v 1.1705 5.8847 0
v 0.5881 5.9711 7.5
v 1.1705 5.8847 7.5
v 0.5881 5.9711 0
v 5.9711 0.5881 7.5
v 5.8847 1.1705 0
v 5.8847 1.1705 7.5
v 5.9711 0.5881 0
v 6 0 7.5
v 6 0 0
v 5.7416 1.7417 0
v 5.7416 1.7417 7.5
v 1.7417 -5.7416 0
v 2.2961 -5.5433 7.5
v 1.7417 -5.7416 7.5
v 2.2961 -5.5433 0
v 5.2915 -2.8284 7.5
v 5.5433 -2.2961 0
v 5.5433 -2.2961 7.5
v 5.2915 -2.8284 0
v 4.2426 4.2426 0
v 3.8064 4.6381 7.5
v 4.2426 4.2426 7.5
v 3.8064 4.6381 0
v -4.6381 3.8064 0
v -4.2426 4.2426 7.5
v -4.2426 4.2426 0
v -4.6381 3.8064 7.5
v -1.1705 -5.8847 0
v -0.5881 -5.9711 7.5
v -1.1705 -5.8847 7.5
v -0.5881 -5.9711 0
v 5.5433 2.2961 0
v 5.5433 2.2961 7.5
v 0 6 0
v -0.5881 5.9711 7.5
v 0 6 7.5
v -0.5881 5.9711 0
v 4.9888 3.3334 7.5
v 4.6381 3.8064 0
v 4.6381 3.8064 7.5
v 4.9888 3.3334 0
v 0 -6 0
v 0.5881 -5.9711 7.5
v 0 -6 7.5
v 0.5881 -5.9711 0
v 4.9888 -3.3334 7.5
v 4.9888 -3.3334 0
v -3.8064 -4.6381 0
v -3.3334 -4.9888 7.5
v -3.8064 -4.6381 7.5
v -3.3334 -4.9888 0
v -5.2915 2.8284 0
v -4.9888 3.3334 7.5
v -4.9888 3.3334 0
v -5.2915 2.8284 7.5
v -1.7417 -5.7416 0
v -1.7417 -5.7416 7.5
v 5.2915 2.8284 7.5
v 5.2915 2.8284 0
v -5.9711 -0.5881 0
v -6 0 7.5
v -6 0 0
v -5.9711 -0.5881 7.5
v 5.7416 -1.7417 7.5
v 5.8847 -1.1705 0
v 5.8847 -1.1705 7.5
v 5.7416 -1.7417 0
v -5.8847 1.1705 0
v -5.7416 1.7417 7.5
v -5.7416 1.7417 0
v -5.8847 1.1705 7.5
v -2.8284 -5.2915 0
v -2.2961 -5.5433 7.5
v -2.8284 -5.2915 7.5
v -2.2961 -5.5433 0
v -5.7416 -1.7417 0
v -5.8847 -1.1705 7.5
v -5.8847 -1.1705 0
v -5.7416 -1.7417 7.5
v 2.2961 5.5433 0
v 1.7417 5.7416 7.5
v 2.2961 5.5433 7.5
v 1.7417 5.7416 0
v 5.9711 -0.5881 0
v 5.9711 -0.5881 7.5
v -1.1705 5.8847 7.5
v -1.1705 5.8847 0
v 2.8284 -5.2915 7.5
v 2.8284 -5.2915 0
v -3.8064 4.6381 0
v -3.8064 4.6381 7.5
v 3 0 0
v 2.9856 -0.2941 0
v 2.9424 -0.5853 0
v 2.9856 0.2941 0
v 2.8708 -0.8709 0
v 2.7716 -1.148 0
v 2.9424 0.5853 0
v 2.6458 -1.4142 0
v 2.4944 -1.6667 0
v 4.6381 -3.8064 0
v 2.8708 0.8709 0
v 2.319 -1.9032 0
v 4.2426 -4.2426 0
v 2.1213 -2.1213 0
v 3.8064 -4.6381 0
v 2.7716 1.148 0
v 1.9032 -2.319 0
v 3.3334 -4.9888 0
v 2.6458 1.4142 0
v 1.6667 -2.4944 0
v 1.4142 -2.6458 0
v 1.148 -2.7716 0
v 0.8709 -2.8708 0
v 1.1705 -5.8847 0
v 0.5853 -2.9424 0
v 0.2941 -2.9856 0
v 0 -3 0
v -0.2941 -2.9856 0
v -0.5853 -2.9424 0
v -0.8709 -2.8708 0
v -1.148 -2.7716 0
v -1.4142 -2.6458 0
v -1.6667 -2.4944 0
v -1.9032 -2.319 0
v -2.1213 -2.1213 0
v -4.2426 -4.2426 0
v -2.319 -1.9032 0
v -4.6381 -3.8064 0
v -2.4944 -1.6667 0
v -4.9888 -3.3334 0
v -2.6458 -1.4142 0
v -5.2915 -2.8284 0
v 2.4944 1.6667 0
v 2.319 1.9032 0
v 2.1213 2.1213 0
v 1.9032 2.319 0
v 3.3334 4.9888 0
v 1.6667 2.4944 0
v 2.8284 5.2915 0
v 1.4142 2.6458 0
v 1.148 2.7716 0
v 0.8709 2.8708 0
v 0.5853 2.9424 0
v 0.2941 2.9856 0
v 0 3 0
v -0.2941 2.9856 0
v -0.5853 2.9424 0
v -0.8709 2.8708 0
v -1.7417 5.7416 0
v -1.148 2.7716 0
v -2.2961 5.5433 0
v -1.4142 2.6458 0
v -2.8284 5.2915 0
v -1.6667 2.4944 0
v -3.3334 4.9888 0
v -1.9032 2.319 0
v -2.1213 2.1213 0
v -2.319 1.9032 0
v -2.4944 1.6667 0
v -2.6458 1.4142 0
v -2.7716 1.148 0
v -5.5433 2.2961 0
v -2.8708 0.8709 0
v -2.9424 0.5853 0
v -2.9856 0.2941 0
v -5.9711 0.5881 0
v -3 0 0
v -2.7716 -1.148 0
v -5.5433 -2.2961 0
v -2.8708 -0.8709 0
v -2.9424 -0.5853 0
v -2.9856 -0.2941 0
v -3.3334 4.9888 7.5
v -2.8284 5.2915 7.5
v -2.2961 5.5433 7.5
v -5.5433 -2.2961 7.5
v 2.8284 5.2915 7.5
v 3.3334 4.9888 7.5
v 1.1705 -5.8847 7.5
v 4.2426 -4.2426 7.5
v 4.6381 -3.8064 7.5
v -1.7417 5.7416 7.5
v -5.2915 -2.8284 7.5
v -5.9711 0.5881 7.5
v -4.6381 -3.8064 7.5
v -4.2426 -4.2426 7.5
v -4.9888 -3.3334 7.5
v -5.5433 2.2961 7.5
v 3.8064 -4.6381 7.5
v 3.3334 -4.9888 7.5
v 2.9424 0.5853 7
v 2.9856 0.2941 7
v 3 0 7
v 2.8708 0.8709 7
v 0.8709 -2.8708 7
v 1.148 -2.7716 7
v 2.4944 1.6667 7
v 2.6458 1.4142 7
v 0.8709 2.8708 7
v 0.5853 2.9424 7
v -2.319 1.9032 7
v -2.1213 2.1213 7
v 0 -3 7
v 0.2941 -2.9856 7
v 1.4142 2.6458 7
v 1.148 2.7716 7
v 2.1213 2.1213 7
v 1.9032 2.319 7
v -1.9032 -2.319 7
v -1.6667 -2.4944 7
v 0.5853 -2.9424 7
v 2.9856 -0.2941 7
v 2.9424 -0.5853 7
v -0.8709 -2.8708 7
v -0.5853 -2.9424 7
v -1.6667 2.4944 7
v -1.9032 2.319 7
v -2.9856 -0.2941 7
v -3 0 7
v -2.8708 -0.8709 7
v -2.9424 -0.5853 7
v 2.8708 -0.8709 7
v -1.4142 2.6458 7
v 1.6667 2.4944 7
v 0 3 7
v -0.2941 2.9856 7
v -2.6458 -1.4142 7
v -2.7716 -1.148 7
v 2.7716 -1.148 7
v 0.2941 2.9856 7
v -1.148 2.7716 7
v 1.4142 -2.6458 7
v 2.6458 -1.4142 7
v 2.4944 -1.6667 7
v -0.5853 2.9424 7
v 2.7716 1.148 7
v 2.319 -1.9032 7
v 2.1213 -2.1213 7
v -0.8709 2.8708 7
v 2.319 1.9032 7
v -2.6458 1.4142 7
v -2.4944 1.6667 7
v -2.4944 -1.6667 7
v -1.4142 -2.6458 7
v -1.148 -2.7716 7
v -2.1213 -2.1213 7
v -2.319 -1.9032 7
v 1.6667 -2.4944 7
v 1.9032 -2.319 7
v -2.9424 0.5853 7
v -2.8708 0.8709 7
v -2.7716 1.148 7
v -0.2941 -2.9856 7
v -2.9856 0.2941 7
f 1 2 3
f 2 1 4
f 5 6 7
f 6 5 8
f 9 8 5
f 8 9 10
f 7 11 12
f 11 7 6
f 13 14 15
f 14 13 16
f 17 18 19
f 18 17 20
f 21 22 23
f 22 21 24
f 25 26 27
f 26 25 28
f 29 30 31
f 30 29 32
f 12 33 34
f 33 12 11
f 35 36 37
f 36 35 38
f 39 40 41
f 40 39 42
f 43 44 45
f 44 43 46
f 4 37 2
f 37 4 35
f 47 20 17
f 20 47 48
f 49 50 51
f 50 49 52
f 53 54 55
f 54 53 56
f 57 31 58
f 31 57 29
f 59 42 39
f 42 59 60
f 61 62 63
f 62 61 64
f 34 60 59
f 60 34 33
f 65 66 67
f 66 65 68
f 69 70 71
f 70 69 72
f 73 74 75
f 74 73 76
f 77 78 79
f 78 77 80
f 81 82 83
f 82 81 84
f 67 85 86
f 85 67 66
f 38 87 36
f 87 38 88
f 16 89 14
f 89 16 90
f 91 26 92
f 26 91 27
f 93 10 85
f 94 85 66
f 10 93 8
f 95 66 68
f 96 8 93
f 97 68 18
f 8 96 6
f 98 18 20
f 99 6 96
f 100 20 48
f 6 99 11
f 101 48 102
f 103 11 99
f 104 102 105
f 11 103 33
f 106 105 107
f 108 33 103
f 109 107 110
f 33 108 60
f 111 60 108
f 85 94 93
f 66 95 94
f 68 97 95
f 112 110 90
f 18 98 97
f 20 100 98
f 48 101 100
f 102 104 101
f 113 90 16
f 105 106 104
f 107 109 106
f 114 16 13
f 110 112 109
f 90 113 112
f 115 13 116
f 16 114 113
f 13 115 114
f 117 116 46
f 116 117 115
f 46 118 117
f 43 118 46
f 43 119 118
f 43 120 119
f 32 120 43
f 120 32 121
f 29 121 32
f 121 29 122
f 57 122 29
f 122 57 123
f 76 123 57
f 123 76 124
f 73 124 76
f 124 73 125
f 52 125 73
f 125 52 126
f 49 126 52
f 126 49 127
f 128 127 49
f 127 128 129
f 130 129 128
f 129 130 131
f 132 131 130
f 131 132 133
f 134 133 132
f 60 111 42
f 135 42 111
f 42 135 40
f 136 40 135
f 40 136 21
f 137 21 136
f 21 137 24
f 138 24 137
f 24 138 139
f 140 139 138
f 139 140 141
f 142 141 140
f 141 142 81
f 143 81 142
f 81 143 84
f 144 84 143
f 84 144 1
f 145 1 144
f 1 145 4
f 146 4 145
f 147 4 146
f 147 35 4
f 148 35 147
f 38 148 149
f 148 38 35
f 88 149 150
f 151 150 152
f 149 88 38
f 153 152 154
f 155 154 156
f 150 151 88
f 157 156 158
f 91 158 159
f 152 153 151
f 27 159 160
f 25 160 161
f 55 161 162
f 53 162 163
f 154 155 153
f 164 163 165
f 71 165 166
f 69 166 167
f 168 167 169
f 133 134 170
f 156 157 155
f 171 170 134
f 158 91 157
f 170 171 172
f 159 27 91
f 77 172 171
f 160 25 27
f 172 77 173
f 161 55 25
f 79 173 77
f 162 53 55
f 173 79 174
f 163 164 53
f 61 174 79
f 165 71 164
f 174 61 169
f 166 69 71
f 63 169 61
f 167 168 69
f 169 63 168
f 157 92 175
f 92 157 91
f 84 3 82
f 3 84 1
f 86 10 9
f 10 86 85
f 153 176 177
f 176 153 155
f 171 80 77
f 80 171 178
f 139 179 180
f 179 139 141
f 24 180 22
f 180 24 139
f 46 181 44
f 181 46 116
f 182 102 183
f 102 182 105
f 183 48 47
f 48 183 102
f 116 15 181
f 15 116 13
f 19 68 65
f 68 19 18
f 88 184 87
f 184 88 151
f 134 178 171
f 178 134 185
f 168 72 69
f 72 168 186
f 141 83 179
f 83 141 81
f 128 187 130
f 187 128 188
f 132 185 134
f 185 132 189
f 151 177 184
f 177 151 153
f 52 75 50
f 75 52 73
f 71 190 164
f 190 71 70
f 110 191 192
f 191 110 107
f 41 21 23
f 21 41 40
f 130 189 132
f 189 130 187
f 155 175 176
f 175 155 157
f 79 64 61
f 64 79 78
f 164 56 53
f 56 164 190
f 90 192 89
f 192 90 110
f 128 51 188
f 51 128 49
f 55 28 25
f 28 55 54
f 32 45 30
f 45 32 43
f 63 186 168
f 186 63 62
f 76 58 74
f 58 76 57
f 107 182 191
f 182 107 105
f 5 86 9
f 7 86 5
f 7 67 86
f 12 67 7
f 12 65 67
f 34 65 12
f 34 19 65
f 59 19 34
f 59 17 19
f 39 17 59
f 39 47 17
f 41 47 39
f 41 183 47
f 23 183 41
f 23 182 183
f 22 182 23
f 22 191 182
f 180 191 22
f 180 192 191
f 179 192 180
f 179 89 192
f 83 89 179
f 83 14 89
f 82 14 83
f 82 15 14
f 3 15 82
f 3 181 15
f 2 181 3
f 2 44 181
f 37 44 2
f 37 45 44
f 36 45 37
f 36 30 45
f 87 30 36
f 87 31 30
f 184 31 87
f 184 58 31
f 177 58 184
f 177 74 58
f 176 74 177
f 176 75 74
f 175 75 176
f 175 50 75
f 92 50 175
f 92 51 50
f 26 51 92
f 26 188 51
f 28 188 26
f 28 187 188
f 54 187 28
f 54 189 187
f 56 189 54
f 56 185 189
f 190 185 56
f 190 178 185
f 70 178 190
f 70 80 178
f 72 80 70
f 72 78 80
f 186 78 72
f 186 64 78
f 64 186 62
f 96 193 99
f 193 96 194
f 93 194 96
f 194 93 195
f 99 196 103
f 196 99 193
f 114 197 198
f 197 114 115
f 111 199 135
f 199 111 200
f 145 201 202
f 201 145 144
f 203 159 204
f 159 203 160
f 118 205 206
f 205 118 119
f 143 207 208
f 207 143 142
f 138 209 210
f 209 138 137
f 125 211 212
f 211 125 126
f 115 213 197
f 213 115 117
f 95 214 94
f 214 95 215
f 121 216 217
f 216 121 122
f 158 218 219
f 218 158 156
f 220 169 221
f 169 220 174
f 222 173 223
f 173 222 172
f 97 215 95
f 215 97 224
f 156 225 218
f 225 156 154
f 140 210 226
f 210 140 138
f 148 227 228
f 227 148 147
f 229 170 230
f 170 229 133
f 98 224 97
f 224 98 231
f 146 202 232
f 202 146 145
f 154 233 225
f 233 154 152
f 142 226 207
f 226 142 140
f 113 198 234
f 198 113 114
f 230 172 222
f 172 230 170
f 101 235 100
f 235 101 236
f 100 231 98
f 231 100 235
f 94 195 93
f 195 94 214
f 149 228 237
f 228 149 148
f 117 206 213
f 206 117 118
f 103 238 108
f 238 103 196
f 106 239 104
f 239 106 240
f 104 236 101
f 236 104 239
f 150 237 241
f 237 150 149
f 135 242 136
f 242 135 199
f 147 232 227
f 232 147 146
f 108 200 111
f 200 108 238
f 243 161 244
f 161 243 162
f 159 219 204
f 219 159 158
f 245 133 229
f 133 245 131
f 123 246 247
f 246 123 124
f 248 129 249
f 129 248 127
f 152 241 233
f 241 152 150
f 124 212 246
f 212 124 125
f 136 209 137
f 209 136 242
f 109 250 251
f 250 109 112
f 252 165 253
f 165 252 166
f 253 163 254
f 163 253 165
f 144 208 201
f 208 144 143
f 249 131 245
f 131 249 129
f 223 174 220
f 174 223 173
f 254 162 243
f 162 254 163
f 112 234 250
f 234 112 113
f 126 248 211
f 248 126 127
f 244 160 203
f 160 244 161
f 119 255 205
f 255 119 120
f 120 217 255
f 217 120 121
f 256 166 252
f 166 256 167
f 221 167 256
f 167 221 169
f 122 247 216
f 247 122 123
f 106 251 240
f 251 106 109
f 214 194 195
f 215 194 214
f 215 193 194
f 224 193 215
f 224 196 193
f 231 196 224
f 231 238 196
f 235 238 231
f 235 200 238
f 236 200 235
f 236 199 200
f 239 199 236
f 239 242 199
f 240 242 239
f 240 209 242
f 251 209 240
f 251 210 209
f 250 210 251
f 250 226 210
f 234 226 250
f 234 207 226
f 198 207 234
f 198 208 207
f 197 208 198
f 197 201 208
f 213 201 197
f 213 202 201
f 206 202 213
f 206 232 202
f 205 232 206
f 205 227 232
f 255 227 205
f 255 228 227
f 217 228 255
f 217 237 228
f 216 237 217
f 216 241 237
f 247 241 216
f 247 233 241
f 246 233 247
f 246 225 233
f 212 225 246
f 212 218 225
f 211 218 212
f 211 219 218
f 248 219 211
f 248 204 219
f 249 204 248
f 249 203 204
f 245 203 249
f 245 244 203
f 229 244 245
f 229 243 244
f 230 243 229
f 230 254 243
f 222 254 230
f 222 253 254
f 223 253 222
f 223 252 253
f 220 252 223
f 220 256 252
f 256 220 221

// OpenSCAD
module potentiometer() {
    difference() {
        union() {
            // Main body
            cylinder(h=6.5, d=12, $fn=64);
            // Knob
            translate([0, 0, 6.5])
                cylinder(h=1.0, d=12, $fn=64);
        }
        // Shaft hole
        translate([0, 0, -1])
            cylinder(h=8, d=6, $fn=64);
    }
}

potentiometer();
